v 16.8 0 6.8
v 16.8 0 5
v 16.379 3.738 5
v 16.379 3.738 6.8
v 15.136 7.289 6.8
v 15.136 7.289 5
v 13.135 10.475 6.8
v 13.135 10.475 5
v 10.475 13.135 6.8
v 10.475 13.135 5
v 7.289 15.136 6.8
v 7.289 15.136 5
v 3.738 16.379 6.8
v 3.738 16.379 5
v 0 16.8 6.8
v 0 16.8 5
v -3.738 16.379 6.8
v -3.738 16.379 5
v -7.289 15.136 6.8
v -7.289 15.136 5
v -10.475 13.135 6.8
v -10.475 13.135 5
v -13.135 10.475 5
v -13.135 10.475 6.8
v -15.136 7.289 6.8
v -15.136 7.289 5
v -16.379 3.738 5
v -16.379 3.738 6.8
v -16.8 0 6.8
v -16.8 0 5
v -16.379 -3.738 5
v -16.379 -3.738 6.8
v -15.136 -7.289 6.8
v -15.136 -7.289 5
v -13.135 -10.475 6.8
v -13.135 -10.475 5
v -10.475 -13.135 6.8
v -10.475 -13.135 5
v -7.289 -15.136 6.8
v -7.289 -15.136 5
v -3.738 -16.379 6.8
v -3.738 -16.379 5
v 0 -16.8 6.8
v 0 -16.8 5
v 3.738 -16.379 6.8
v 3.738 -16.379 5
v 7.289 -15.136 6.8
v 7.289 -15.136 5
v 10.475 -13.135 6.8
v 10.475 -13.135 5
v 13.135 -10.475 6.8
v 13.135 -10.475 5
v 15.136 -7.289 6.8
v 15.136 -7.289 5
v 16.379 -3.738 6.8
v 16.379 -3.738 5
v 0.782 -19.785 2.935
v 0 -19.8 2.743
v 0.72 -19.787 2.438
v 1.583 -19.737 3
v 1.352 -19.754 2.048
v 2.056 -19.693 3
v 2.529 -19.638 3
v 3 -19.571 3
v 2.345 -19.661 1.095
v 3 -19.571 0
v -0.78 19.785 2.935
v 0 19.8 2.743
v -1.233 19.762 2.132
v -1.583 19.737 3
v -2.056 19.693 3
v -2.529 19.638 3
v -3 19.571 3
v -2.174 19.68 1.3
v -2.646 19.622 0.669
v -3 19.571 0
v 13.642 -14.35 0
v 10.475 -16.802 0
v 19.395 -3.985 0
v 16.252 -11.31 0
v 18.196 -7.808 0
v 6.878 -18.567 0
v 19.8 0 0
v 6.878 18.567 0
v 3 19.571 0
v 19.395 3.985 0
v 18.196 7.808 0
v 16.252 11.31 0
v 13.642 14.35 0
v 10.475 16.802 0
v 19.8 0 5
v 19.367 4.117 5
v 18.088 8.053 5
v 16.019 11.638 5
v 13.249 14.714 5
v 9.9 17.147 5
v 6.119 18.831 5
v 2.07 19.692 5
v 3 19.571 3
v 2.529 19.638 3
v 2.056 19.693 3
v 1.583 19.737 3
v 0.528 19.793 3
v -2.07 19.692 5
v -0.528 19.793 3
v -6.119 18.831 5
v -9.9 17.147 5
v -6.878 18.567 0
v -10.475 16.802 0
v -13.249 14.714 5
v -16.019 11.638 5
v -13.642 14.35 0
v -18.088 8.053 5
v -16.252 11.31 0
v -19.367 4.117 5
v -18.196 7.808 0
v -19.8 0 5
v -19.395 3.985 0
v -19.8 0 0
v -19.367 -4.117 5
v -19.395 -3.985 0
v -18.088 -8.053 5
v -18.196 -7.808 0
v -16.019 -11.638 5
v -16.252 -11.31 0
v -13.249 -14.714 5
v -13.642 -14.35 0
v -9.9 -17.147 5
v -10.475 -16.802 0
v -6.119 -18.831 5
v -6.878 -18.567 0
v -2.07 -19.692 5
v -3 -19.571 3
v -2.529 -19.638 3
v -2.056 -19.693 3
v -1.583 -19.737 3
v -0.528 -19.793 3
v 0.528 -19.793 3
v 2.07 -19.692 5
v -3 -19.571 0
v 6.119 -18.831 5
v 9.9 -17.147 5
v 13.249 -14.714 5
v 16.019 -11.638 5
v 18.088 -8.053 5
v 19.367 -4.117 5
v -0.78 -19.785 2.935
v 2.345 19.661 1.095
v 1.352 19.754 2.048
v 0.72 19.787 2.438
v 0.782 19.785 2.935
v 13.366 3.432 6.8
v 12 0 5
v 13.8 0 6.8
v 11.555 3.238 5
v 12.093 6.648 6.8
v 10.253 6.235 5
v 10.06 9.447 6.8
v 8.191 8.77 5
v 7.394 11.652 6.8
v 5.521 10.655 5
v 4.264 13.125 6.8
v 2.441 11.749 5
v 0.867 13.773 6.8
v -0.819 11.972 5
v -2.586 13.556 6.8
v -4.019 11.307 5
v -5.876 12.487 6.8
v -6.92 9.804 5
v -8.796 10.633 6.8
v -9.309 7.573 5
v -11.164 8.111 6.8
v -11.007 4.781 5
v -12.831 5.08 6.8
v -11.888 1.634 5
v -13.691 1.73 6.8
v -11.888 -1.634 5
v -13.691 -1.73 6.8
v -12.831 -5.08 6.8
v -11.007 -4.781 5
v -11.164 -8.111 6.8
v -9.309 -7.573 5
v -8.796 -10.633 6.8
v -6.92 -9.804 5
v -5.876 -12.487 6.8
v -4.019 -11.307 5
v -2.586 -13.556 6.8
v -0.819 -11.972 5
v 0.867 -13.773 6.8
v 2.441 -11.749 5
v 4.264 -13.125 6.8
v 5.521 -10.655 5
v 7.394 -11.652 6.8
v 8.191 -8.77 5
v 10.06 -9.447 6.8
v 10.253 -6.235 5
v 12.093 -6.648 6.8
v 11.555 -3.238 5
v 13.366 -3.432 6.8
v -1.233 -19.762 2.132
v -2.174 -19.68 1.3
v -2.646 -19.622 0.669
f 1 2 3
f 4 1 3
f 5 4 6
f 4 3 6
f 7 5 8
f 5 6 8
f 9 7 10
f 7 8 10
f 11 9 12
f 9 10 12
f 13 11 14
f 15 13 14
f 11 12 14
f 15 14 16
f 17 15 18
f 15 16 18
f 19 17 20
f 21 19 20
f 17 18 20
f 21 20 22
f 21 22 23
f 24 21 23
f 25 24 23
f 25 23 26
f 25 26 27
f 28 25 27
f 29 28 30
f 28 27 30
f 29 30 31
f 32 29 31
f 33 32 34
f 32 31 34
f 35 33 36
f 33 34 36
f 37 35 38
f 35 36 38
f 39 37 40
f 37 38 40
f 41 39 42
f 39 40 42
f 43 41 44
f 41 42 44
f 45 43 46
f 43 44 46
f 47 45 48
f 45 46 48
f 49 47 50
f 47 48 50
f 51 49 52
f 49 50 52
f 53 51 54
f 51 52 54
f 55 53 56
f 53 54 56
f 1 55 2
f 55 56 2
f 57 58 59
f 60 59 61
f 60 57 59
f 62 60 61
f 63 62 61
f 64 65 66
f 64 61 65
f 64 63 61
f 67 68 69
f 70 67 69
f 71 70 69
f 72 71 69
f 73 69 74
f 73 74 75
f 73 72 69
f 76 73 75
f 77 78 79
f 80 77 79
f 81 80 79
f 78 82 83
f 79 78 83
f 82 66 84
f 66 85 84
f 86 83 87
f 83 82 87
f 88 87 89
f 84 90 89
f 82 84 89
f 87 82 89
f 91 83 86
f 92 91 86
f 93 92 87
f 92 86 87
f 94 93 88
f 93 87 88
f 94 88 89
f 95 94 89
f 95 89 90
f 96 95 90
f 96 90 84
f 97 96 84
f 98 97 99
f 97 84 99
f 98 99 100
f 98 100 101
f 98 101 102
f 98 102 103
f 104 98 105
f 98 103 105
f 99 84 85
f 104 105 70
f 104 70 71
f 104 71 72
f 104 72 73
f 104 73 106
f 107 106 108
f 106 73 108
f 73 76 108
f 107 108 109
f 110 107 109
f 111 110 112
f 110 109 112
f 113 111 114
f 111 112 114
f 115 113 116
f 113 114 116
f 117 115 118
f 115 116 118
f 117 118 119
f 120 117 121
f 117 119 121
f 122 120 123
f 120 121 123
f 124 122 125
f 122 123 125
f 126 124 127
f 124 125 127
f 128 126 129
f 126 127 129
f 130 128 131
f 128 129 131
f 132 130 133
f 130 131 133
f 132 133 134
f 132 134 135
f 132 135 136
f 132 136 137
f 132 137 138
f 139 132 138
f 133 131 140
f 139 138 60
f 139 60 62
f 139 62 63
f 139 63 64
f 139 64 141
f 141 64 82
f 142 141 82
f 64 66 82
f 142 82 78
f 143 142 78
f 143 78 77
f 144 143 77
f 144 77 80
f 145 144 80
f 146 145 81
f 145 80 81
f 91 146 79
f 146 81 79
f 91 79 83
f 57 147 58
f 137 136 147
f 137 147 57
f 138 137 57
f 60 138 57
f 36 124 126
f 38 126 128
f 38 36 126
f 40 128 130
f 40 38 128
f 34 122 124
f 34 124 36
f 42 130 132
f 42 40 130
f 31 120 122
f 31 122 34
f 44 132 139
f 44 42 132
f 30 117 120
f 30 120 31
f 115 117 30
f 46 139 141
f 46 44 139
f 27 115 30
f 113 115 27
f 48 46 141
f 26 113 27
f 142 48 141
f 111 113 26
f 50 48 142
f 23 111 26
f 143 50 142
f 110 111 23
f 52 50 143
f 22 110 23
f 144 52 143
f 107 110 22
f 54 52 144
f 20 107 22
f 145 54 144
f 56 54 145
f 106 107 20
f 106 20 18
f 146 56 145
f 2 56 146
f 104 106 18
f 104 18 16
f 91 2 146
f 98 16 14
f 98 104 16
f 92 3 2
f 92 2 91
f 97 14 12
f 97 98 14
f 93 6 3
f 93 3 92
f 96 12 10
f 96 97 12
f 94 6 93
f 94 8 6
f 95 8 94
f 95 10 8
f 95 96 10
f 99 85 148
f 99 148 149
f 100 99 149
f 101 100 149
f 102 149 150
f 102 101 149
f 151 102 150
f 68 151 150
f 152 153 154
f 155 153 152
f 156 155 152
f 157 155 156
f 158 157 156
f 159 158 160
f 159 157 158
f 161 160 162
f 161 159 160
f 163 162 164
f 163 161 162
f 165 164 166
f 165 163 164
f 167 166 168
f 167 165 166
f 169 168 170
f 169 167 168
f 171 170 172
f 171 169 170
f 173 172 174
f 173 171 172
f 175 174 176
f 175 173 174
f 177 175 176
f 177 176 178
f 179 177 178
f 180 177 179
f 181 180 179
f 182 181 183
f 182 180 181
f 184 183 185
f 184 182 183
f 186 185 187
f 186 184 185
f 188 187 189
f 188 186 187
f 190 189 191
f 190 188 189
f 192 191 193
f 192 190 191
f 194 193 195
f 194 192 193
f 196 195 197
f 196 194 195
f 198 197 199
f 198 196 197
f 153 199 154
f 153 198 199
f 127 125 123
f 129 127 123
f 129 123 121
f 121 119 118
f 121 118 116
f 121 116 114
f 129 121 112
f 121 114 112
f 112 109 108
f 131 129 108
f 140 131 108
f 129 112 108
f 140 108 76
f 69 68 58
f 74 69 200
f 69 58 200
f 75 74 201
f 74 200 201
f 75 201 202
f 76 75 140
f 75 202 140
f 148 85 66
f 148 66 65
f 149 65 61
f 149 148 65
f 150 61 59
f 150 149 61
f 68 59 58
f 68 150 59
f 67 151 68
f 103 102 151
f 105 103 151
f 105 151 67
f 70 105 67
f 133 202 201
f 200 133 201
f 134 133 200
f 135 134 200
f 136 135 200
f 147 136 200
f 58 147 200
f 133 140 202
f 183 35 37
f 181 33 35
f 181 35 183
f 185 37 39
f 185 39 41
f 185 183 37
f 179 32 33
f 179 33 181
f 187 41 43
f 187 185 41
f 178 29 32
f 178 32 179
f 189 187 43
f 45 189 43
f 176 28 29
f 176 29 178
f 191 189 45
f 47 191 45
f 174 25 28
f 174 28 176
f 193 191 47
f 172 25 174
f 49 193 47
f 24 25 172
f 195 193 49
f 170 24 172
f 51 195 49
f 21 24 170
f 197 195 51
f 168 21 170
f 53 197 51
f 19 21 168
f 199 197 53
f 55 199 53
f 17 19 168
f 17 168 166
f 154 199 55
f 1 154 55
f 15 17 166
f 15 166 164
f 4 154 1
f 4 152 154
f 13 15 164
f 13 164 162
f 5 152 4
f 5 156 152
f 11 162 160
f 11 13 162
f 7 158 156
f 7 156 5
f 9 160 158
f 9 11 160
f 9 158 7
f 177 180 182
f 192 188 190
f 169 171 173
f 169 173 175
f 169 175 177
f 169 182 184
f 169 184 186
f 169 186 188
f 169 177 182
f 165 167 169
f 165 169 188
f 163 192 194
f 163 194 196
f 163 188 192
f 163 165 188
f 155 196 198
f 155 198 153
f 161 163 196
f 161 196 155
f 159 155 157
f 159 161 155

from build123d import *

# Parameters (mm, degrees)
F0_R         = 19.8
F1_DEPTH     = 5
F2_R         = 16.8
F2_R_2       = 16
F3_DEPTH     = 1.8
F6_DEPTH     = 3
F7_T4_DEPTH  = 62.0556939075
F7_S5_R      = 19.8
F7_T6_DEPTH  = 33
F7_T10_DEPTH = 62.0556939075
F7_S11_R     = 19.8
F7_T12_DEPTH = 33


# Not quite as in the source:
# - a fillet or chamfer that OpenCascade refuses, or shapes differently, is made with other operations: its cross-section is extruded or revolved along the edge and cut away or added


with BuildPart() as f1:
    # F0 (on Top) → F1 (new body)
    with BuildSketch(Plane.XY):
        Circle(F0_R)
    extrude(amount=F1_DEPTH)

    # F2 (on face) → F3 (join)
    with BuildSketch(Plane.XY.offset(5)):
        Circle(F2_R)
        Circle(F2_R_2, mode=Mode.SUBTRACT)
    extrude(amount=F3_DEPTH)

    # F4: chamfer of 4 on 1 edges, made by hand


with BuildPart() as f4_tool2:
    # F4_s3 → F4_t4 (revolve)
    with BuildSketch(Plane.XZ):
        Polygon((16, 9), (12, 5), (16, 5), align=None)
    revolve(axis=Axis((0, 0, 5), (0, 0, 1)))

    split(bisect_by=Plane.XY.offset(6.8), keep=Keep.BOTTOM)


with BuildPart() as f1_1:
    add(f1.part)

    # F4_t1: union F4_tool2
    add(f4_tool2.part)

    # F5 (on face) → F6 (cut)
    with BuildSketch(Plane(origin=(0, 0, 0), x_dir=(1, 0, 0), z_dir=(0, 0, -1))):
        with BuildLine():
            Line((-3, 19.5714077164), (-3, -19.5714077164))
            ThreePointArc((-3, -19.5714077164), (0, -19.8), (3, -19.5714077164))
            Line((3, -19.5714077164), (3, 19.5714077164))
            ThreePointArc((3, 19.5714077164), (0, 19.8), (-3, 19.5714077164))
        make_face()
    extrude(amount=-F6_DEPTH, mode=Mode.SUBTRACT)

    # F7: fillet of radius 5 on 2 edges, made by hand


with BuildPart() as f7_tool2:
    # F7_s3 → F7_t4 (new body)
    with BuildSketch(Plane.XZ.offset(-31.0278469537)):
        with BuildLine():
            ThreePointArc((3, 0), (1.1560370926, 2.1833001327), (-1.582575695, 3))
            Line((-1.582575695, 3), (3, 3))
            Line((3, 3), (3, 0))
        make_face()
    extrude(amount=F7_T4_DEPTH)

    # F7_s5 → F7_t6 (intersect, symmetric)
    with BuildSketch(Plane.XY.offset(1.5)):
        Circle(F7_S5_R)
    extrude(amount=F7_T6_DEPTH, both=True, mode=Mode.INTERSECT)


with BuildPart() as f1_2:
    add(f1_1.part)

    # F7_t1: union F7_tool2
    add(f7_tool2.part)


with BuildPart() as f7_tool8:
    # F7_s9 → F7_t10 (new body)
    with BuildSketch(Plane.XZ.offset(31.0278469537)):
        with BuildLine():
            ThreePointArc((1.582575695, 3), (-1.1560370926, 2.1833001327), (-3, 0))
            Line((-3, 0), (-3, 3))
            Line((-3, 3), (1.582575695, 3))
        make_face()
    extrude(amount=-F7_T10_DEPTH)

    # F7_s11 → F7_t12 (intersect, symmetric)
    with BuildSketch(Plane.XY.offset(1.5)):
        Circle(F7_S11_R)
    extrude(amount=F7_T12_DEPTH, both=True, mode=Mode.INTERSECT)


with BuildPart() as f1_3:
    add(f1_2.part)

    # F7_t7: union F7_tool8
    add(f7_tool8.part)


solid = f1_3.part
